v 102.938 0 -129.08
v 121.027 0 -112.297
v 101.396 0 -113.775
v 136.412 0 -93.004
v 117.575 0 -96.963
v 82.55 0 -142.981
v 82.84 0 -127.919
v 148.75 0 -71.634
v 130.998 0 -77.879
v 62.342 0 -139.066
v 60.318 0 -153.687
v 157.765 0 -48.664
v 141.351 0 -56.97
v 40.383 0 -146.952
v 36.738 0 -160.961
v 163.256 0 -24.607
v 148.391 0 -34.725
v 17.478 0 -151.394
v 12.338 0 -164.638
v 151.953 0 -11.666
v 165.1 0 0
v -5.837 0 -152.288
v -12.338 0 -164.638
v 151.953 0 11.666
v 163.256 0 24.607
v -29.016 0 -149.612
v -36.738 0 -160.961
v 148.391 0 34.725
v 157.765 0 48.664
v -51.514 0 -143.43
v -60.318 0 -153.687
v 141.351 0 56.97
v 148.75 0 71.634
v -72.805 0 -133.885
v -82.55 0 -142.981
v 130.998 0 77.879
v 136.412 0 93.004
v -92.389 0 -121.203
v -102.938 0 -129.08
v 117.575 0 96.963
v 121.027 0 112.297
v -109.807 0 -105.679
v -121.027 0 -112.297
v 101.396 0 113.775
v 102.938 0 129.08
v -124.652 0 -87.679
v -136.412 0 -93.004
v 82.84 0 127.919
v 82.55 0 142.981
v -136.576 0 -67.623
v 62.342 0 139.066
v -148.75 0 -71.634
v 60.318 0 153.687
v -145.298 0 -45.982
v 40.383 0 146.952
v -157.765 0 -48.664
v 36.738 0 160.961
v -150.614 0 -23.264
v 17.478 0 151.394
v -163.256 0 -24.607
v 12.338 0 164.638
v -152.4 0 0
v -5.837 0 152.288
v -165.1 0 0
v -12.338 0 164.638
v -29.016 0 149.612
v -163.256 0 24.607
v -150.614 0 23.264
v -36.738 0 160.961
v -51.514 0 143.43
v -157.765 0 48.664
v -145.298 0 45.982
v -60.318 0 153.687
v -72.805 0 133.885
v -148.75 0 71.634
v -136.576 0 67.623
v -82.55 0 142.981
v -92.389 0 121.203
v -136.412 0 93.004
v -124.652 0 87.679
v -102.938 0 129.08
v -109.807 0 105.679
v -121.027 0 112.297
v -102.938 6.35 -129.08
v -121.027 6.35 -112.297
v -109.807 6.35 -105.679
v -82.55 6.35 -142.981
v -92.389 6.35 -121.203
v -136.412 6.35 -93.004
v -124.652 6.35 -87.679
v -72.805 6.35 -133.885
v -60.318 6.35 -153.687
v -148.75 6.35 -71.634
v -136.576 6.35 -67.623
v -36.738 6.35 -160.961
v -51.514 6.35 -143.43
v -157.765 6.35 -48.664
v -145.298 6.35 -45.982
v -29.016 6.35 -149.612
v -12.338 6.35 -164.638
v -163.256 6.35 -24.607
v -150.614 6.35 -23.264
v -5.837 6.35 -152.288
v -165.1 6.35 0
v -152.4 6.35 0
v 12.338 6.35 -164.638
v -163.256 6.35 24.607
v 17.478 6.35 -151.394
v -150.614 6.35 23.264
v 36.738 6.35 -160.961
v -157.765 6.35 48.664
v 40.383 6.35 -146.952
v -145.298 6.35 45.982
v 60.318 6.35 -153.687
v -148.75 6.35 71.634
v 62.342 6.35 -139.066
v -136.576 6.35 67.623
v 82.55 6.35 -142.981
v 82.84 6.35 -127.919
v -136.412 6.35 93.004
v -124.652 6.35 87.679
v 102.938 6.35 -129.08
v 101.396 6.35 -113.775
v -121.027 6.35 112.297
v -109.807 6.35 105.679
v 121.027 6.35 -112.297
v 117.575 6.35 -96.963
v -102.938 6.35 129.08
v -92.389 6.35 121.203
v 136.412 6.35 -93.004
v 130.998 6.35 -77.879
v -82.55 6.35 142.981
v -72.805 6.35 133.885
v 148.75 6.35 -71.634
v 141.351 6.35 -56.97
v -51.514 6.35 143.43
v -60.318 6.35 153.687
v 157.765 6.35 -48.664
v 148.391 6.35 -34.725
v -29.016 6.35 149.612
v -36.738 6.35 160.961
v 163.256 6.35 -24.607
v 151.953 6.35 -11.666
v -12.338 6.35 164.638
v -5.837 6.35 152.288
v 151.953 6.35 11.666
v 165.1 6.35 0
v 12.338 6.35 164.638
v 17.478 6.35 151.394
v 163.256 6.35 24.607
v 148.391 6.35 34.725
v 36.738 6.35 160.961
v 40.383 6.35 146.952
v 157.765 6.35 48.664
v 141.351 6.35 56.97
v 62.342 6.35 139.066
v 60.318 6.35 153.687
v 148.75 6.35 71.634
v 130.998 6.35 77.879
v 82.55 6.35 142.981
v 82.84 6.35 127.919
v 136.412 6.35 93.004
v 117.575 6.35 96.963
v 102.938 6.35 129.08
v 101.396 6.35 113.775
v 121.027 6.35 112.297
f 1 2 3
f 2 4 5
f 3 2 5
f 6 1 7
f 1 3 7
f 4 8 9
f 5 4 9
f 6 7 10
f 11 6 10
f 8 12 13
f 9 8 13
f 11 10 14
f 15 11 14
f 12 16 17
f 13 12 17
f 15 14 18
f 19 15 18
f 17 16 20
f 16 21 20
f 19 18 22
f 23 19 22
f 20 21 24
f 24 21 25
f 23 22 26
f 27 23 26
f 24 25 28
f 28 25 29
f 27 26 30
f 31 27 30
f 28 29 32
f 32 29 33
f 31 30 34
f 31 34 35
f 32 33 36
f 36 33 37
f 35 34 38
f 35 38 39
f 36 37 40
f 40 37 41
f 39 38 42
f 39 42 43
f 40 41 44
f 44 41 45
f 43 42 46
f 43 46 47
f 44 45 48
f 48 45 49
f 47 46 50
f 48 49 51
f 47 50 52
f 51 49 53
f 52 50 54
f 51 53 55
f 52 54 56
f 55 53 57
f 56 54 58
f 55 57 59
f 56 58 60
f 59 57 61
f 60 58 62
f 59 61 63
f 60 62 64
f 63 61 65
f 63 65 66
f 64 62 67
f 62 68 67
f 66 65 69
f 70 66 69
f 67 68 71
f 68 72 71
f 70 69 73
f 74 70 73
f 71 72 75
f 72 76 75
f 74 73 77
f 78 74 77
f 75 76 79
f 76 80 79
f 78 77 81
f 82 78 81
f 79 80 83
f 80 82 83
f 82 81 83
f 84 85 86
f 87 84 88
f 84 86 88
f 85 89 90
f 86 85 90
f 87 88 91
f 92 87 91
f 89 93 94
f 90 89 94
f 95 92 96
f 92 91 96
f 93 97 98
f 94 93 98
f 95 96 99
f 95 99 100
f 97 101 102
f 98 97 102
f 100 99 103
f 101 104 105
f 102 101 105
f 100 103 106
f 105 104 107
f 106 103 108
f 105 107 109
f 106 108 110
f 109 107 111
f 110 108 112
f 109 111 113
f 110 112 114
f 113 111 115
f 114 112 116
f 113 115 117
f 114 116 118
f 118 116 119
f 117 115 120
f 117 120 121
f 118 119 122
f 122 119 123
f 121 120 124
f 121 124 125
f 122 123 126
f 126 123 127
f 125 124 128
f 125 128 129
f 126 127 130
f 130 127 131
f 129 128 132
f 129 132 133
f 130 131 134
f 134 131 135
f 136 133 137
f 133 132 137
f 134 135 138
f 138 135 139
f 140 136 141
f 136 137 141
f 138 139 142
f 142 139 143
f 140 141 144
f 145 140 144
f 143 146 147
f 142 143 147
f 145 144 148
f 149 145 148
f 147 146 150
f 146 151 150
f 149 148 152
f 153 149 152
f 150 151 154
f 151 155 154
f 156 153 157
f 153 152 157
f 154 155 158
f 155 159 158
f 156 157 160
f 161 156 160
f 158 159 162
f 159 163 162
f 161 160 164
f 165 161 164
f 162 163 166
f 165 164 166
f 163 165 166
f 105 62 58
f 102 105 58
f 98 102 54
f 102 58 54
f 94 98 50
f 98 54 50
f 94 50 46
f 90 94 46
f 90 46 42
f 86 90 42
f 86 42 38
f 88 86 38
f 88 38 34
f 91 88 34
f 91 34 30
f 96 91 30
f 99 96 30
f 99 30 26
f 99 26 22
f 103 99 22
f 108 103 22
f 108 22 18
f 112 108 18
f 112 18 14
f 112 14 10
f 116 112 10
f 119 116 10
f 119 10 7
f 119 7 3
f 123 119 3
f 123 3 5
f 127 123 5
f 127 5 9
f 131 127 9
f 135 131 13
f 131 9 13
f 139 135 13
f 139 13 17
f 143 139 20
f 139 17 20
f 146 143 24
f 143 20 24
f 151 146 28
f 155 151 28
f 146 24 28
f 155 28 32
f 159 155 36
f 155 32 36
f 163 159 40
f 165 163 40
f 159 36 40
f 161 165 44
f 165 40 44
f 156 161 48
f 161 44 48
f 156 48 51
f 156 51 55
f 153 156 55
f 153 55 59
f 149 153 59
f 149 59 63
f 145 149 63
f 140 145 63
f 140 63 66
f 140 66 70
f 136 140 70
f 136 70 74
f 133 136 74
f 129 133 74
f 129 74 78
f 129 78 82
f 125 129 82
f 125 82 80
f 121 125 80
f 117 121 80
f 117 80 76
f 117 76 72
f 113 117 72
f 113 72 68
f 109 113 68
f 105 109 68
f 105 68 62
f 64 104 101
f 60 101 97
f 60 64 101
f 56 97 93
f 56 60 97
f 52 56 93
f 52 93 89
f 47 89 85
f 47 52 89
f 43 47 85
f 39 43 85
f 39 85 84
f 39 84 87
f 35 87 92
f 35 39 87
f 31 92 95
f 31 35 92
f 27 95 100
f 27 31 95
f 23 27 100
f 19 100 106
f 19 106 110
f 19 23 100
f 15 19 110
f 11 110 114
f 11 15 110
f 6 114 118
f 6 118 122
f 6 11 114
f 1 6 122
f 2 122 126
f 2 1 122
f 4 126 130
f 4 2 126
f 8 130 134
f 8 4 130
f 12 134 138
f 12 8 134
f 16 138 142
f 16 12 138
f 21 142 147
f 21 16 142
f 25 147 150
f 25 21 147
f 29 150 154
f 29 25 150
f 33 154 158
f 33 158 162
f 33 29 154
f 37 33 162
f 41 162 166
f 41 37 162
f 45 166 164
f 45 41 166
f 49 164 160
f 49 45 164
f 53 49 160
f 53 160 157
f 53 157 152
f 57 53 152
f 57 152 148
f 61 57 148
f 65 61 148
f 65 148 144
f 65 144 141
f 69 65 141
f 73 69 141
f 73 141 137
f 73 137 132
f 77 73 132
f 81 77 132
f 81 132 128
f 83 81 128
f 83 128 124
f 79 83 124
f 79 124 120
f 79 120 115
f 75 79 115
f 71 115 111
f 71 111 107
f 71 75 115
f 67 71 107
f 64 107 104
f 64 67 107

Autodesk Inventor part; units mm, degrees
sketch "Sketch1" plane through (0, 0, 0) normal (0, 1, 0) x (-1, 0, 0)
  circle A0 centre (0, 0) radius 152.4
  circle A1 centre (0, 0) radius 165.1
  dimension "d0" = 304.8
  dimension "d1" = 330.2
extrude "Extrusion1" add sketch "Sketch1" along normal blind 152.4
sketch "Sketch2" plane through (0, 0, 0) normal (1, 0, 0) x (0, 1, 0)
  circle A0 centre (100.6077, 0) radius 25.4
  point P0 (0, 0)
  dimension "d4" = 50.8
extrude "Extrusion2" add sketch "Sketch2" along normal mid plane 889
sketch "Sketch4" plane through (0, 152.4, 0) normal (0, 1, 0) x (1, 0, 0)
  circle A0 centre (0, 0) radius 152.4
extrude "Extrusion4" cut sketch "Sketch4" against normal through all
sketch "Sketch5" plane through (0, 152.4, 0) normal (0, 1, 0) x (1, 0, 0)
  circle A0 centre (0, 0) radius 165.1
extrude "Extrusion5" add sketch "Sketch5" along normal blind 50.8 draft -50
ref_plane "Work Plane2" through (75.376, -18.8821, -44.9646) normal (1, 0, 0) x (0, 1, 0)
ref_plane "Work Plane5" through (0, 25.4, 165.1) normal (0, 0, 1) x (1, 0, 0)
sketch "Sketch11" plane through (0, 25.4, 165.1) normal (0, 0, 1) x (1, 0, 0)
  circle A0 centre (0, 75.2094) radius 25.4
  line L0 (165.1, -25.4) -> (-165.1, -25.4) projected
  point P0 (0, -25.4)
  dimension "d31" = 50.8
  dimension "d32" = 100.6094
extrude "Extrusion11" add sketch "Sketch11" along normal blind 280.543
ref_plane "Work Plane6" through (0, 25.4, -165.1) normal (0, 0, 1) x (1, 0, 0)
sketch "Sketch12" plane through (0, 25.4, -165.1) normal (0, 0, 1) x (1, 0, 0)
  circle A0 centre (0, 75.2094) radius 25.4
  line L0 (165.1, -25.4) -> (-165.1, -25.4) projected
  point P0 (0, -25.4)
  dimension "d36" = 50.8
  dimension "d37" = 100.6094
extrude "Extrusion12" add sketch "Sketch12" against normal blind 280.543
ref_plane "Work Plane10" through (0, 152.4, 0) normal (0, -1, 0) x (1, 0, 0)
ref_plane "Work Plane9" through (0, 63.5, 0) normal (0, -1, 0) x (1, 0, 0)
sketch "Sketch13" plane through (0, 152.4, 0) normal (0, -1, 0) x (1, 0, 0)
  line L0 (-199.2875, -201.2037) -> (234.7376, -201.2037)
  line L1 (234.7376, -201.2037) -> (234.7376, 210.7848)
  line L2 (234.7376, 210.7848) -> (-199.2875, 210.7848)
  line L3 (-199.2875, 210.7848) -> (-199.2875, -201.2037)
  point P0 (0, 0)
extrude "Extrusion13" cut sketch "Sketch13" against normal blind 127
ref_plane "Work Plane11" through (0, 63.5, 0) normal (0, -1, 0) x (1, 0, 0)
sketch "Sketch15" plane through (0, 63.5, 0) normal (0, -1, 0) x (1, 0, 0)
  line L0 (-509.2014, 528.9036) -> (494.7202, 528.9036)
  line L1 (494.7202, 528.9036) -> (494.7202, -498.4488)
  line L2 (494.7202, -498.4488) -> (-509.2014, -498.4488)
  line L3 (-509.2014, -498.4488) -> (-509.2014, 528.9036)
  point P0 (0, 0)
extrude "Extrusion15" cut sketch "Sketch15" against normal blind 254
ref_plane "Work Plane12" through (0, 25.4, 0) normal (0, -1, 0) x (1, 0, 0)
sketch "Sketch16" plane through (0, 25.4, 0) normal (0, -1, 0) x (1, 0, 0)
  line L0 (-189.4244, 211.7722) -> (231.9916, 211.7722)
  line L1 (231.9916, 211.7722) -> (231.9916, -229.8633)
  line L2 (231.9916, -229.8633) -> (-189.4244, -229.8633)
  line L3 (-189.4244, -229.8633) -> (-189.4244, 211.7722)
  point P0 (0, 0)
extrude "Extrusion16" cut sketch "Sketch16" against normal blind 254
ref_plane "Work Plane14" through (-0.824, -18.8821, -44.9646) normal (1, 0, 0) x (0, 1, 0)
ref_plane "Work Plane13" through (164.276, -18.8821, -44.9646) normal (1, 0, 0) x (0, 1, 0)
ref_plane "Work Plane15" through (0, 25.4, 0) normal (0, -1, 0) x (1, 0, 0)
sketch "Sketch17" plane through (0, 25.4, 0) normal (0, -1, 0) x (1, 0, 0)
  line L0 (-206.305, -203.3787) -> (218.0102, -203.3787)
  line L1 (218.0102, -203.3787) -> (218.0102, 226.7892)
  line L2 (218.0102, 226.7892) -> (-206.305, 226.7892)
  line L3 (-206.305, 226.7892) -> (-206.305, -203.3787)
  point P0 (0, 0)
extrude "Extrusion17" cut sketch "Sketch17" along normal blind 19.05
ref_plane "Work Plane8" through (0, 0, 0) normal (0, -1, 0) x (1, 0, 0)
properties part number "UpperSailCapBottom-ver1-1111-2021"
